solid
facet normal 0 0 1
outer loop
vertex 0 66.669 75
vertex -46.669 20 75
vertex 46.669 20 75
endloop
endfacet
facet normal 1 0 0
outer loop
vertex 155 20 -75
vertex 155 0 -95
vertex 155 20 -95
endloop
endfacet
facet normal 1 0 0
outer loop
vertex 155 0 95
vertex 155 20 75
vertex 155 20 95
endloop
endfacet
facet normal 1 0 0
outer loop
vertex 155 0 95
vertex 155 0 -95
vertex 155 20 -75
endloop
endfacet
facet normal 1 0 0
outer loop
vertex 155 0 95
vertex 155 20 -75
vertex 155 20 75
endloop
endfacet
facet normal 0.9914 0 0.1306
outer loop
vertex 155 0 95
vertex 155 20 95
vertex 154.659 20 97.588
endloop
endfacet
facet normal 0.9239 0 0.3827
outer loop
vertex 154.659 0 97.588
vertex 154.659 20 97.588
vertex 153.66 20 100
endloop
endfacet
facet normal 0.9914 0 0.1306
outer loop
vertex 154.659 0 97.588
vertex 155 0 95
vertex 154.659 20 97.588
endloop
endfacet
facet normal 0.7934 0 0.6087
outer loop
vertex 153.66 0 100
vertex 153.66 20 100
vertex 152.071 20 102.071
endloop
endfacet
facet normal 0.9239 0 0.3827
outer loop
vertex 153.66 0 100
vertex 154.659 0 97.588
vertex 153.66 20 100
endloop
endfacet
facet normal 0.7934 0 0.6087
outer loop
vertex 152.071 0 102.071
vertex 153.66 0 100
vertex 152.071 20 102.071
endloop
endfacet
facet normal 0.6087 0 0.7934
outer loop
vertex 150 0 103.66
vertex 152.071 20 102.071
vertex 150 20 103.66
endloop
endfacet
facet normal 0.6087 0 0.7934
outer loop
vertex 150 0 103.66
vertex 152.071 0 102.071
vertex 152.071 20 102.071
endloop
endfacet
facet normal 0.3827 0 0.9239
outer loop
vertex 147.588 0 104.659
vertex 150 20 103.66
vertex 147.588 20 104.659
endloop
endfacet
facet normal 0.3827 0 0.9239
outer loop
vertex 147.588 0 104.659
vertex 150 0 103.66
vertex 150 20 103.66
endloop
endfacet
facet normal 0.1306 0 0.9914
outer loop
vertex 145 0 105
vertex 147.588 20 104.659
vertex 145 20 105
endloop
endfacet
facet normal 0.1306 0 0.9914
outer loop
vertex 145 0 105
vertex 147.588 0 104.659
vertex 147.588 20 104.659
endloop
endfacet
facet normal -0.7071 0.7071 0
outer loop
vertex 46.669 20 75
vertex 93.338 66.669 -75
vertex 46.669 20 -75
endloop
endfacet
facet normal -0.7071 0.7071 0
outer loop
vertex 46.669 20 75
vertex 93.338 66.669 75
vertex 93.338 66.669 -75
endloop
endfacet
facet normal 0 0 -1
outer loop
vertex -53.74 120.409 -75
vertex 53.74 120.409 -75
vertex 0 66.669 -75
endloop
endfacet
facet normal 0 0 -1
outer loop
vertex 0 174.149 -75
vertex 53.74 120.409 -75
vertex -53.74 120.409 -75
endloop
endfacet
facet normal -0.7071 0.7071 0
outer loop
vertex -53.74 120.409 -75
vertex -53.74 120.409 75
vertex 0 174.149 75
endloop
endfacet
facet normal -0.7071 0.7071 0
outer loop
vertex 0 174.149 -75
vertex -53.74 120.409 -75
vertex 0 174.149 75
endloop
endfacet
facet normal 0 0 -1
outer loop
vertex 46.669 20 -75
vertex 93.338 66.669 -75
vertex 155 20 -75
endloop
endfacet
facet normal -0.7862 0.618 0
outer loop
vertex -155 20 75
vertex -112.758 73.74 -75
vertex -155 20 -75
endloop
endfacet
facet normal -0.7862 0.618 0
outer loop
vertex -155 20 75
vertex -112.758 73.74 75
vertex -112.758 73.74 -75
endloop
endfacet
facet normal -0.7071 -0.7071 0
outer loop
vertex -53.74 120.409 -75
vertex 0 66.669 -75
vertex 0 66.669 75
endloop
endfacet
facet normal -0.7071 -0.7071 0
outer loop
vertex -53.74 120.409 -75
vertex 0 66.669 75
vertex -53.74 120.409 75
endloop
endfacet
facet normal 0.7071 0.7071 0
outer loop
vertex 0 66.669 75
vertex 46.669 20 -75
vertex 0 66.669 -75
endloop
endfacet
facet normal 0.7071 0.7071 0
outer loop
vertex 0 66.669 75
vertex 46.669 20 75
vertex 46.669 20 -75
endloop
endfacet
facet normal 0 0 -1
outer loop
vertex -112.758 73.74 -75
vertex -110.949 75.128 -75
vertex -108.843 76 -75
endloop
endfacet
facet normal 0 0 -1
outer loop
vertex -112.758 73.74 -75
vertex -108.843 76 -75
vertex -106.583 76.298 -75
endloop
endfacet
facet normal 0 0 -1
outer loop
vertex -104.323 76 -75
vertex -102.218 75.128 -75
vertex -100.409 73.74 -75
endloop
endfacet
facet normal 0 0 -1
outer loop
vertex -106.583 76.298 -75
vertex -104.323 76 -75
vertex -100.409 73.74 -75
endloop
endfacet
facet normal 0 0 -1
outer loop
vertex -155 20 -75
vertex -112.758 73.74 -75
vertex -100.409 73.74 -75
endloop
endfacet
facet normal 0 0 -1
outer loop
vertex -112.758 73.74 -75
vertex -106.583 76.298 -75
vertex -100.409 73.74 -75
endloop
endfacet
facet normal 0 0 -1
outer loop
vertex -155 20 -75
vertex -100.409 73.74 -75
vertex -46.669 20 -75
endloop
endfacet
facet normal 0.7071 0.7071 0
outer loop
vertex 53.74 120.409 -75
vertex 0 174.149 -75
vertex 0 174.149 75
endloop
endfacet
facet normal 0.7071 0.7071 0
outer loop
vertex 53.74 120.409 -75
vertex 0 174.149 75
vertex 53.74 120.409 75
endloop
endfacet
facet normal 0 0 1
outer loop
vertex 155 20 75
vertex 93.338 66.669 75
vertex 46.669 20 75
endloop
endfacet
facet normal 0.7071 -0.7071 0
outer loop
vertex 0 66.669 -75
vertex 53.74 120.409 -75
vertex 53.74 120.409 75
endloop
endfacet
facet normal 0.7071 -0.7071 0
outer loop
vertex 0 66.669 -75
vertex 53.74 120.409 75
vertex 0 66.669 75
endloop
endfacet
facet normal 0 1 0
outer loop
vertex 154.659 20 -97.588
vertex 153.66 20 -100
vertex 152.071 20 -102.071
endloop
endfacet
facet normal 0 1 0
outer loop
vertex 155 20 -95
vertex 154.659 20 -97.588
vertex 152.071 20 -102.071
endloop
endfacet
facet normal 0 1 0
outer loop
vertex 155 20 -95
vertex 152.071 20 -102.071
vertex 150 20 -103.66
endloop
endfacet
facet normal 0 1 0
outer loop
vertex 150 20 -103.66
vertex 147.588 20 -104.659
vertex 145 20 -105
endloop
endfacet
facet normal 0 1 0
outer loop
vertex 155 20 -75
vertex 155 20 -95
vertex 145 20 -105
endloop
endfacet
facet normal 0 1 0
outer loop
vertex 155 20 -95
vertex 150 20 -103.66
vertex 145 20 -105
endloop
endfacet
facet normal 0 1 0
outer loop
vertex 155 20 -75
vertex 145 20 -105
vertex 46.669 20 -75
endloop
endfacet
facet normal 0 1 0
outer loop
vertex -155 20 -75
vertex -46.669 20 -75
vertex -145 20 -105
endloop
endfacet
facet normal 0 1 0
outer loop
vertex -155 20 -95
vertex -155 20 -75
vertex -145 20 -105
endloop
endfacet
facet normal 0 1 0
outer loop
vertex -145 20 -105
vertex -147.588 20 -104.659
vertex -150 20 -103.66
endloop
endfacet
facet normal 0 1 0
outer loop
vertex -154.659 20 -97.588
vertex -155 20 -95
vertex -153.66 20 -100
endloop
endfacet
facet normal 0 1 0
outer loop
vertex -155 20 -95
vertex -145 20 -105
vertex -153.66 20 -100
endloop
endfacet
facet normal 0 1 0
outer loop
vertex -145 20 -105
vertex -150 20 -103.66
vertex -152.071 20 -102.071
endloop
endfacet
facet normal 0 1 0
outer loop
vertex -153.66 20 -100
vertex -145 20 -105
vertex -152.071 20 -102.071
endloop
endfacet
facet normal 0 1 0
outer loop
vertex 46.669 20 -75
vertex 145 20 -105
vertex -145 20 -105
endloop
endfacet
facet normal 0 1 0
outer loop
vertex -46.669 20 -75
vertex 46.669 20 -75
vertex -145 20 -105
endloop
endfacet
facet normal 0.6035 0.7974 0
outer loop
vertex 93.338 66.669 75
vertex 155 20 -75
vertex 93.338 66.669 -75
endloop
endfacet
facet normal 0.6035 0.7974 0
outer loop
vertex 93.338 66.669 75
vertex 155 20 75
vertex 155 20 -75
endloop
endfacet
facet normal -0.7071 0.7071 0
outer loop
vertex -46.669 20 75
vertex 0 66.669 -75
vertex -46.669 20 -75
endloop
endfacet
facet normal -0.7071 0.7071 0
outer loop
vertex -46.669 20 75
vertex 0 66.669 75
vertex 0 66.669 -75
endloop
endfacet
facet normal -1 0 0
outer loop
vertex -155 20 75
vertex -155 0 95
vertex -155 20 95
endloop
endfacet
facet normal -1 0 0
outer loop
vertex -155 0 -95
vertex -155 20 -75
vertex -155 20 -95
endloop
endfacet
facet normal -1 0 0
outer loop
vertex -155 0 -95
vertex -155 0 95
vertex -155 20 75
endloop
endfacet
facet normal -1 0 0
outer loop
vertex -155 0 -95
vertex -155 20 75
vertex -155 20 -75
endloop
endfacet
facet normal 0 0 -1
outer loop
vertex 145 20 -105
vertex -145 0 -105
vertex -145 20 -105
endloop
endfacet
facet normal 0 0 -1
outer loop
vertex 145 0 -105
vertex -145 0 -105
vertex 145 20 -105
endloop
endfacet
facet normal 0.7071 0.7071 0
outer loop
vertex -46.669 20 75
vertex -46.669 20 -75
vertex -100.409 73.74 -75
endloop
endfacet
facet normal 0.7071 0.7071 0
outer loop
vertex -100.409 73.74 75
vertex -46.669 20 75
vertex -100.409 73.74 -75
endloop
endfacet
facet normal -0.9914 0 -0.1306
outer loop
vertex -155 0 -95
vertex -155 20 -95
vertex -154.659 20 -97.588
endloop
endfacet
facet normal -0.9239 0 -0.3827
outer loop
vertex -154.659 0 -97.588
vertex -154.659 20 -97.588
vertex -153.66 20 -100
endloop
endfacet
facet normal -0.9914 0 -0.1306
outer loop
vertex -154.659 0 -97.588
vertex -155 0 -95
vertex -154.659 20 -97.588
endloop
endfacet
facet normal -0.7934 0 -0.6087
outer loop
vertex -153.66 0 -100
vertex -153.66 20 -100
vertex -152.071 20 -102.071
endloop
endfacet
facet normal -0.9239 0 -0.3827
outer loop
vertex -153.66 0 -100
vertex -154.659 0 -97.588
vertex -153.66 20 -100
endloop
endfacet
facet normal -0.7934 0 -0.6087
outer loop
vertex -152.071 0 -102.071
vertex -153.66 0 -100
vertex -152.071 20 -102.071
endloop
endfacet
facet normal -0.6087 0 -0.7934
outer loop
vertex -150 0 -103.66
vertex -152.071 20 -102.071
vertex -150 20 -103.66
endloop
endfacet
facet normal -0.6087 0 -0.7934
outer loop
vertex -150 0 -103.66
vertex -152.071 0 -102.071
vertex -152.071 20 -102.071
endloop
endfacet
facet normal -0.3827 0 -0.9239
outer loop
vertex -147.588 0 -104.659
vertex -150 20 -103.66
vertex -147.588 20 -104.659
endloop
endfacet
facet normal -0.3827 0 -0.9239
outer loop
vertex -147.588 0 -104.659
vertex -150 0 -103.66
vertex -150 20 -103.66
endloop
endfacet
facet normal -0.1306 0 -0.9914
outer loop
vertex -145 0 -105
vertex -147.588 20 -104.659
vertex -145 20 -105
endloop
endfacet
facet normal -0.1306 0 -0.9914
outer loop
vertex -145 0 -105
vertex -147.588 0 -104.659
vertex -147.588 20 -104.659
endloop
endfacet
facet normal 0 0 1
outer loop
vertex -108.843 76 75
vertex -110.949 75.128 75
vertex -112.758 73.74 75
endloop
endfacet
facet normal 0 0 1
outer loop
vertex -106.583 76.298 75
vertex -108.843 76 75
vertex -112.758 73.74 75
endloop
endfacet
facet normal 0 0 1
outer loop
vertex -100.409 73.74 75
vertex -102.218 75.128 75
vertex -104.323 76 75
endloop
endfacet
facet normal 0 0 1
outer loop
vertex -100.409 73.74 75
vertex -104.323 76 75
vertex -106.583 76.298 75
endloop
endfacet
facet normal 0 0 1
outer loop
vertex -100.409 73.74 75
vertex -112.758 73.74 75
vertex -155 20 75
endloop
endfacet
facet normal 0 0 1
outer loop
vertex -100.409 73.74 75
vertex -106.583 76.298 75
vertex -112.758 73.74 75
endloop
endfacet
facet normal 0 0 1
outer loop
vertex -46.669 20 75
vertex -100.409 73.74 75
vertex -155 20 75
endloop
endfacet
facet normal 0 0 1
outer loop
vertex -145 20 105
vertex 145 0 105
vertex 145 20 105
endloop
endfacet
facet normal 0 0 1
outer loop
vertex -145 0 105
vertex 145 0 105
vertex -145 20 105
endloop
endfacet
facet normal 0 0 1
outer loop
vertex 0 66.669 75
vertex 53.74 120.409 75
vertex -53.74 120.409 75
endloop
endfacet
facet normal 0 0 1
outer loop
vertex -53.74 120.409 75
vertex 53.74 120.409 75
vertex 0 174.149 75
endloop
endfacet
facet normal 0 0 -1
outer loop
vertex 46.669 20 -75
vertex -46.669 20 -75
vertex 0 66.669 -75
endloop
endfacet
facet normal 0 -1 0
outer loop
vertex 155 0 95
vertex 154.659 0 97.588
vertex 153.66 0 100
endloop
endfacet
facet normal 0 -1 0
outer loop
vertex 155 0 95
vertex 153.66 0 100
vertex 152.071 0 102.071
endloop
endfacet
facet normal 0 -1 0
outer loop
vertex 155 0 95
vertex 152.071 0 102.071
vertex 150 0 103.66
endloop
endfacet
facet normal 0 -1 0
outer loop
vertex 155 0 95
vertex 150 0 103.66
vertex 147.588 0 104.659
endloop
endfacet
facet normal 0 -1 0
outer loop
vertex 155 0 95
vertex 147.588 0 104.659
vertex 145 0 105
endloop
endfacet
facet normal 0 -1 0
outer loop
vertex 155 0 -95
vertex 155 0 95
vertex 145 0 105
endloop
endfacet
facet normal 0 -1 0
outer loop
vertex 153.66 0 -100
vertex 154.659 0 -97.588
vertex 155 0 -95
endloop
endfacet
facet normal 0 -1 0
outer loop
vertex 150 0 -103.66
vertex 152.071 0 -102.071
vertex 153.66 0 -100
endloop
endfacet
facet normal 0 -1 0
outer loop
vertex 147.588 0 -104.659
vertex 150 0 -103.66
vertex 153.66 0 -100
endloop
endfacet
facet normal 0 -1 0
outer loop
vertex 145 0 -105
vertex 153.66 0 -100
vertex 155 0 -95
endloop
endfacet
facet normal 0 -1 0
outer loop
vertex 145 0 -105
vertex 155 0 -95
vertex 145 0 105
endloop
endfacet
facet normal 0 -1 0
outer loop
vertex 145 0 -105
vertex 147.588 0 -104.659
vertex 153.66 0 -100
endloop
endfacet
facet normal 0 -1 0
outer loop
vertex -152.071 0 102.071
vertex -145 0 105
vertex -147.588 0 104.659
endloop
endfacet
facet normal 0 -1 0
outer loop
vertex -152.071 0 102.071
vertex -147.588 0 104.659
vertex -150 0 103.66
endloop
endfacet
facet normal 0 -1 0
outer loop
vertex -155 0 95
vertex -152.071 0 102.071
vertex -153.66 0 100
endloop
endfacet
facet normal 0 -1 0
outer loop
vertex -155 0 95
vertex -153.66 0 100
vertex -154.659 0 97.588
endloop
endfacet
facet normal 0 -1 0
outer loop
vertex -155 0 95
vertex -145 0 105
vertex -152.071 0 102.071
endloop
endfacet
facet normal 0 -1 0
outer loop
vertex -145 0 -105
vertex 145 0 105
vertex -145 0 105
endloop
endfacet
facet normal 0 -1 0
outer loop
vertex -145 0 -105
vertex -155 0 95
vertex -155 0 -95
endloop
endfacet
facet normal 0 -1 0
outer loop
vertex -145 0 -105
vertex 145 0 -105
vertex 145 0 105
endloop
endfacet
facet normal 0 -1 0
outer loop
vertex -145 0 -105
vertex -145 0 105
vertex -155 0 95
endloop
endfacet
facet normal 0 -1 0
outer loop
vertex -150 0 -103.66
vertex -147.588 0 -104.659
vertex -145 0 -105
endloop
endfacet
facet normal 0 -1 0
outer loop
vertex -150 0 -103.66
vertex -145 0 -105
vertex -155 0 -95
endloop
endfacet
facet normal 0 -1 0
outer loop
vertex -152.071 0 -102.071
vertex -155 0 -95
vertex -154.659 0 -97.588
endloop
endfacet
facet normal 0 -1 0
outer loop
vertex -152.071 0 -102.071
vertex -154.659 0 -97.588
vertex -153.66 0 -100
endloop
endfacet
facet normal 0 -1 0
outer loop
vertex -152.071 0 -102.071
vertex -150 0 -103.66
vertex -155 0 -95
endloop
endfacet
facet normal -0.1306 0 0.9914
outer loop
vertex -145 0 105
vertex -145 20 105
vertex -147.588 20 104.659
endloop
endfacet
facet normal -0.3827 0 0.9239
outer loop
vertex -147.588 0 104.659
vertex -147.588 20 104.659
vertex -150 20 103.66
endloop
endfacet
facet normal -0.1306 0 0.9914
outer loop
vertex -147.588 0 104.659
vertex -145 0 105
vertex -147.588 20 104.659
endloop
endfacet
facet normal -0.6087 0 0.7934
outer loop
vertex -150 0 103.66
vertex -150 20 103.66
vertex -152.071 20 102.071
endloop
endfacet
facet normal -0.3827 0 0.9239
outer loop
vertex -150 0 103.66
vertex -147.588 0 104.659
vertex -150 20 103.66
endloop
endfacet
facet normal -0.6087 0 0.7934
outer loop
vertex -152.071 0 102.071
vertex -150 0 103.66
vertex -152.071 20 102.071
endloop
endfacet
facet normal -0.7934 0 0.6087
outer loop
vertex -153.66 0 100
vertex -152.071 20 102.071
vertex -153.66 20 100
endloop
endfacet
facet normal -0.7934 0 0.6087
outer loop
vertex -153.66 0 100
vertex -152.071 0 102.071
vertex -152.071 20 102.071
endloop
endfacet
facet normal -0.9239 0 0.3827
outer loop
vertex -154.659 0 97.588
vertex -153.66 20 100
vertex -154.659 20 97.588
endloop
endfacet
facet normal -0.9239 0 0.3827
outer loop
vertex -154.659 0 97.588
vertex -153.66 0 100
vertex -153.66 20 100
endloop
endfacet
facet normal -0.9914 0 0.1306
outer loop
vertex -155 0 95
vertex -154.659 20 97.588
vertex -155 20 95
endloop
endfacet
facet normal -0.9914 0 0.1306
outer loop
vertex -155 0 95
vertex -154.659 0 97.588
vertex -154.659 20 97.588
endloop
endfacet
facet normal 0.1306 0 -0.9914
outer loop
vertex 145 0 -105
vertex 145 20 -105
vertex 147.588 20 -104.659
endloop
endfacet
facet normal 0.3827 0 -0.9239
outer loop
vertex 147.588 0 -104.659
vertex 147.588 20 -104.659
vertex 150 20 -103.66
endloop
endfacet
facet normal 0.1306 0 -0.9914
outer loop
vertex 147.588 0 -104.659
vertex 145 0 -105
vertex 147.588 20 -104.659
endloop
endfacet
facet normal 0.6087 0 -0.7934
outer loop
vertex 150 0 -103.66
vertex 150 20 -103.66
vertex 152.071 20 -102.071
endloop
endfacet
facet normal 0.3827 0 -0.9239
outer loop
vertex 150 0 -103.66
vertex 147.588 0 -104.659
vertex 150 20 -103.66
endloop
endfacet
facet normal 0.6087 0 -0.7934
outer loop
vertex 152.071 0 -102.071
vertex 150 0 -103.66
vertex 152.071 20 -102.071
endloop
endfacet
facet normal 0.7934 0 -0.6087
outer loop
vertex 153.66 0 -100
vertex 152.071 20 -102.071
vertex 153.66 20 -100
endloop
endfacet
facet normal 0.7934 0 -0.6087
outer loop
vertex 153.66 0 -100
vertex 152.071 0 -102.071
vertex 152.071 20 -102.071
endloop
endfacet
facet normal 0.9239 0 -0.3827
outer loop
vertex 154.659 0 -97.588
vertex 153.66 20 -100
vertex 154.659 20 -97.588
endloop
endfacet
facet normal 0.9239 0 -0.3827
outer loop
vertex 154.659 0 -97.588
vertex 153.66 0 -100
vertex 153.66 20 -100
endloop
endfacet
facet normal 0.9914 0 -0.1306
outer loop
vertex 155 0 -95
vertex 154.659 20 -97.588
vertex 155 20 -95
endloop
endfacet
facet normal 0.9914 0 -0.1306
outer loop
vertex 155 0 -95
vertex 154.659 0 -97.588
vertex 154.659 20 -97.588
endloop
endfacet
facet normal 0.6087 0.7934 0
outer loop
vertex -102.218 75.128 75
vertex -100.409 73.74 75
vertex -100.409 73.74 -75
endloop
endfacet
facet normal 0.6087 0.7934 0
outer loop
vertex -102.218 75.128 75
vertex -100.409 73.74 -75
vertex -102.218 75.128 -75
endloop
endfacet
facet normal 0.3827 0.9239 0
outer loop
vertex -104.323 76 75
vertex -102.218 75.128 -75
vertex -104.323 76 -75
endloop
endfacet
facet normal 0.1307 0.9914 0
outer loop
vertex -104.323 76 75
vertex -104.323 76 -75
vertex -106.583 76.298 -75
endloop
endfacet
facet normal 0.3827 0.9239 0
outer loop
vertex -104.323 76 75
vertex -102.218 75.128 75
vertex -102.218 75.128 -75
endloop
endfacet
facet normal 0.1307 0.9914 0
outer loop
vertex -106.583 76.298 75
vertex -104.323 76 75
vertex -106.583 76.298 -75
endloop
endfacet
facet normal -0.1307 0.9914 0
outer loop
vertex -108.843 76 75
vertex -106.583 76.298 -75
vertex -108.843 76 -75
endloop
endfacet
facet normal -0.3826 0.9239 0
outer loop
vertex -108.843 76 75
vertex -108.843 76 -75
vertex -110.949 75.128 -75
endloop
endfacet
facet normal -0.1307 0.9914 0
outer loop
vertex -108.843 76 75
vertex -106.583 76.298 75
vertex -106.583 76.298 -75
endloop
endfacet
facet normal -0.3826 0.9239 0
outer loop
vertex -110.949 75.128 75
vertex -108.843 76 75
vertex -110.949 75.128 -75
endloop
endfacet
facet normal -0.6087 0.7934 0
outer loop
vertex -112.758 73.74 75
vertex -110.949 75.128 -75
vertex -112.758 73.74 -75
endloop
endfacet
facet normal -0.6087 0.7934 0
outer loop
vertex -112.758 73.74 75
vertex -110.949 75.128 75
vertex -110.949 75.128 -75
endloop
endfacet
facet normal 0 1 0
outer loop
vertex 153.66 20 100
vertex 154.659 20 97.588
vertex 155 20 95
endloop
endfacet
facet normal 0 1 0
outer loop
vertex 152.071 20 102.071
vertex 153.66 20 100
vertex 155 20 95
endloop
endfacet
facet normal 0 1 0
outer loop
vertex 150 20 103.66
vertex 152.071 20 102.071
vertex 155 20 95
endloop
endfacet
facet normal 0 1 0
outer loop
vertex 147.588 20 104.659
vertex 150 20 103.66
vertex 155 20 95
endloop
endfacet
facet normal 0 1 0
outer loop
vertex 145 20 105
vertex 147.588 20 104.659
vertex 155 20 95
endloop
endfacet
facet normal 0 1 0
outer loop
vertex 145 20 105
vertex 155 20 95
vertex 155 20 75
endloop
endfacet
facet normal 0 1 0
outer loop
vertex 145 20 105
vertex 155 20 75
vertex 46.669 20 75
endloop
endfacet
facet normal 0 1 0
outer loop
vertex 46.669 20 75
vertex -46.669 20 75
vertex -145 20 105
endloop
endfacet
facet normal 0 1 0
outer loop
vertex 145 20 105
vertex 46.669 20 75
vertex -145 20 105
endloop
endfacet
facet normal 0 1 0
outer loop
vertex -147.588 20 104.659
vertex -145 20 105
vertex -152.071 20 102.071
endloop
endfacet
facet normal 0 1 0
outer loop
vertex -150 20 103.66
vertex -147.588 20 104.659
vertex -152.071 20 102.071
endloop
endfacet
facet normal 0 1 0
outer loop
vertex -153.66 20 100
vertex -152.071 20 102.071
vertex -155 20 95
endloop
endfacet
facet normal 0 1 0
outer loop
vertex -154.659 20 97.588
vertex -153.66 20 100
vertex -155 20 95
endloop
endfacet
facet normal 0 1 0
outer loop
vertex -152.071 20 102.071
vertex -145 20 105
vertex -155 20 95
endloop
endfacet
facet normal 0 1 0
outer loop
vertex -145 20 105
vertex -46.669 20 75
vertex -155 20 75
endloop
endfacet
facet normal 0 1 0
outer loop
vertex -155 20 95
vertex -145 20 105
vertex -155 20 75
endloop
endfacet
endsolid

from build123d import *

# Parameters (mm, degrees)
BOSS_EXTRUDE1_DEPTH = 20
BOSS_EXTRUDE2_DEPTH = 75


with BuildPart() as part:
    # Sketch2 → Boss-Extrude1 (new body)
    with BuildSketch(Plane(origin=(0, 0, 0), x_dir=(1, 0, 0), z_dir=(0, 1, 0))):
        with BuildLine():
            Line((-145, 105), (145, 105))
            ThreePointArc((145, 105), (152.071067812, 102.071067812), (155, 95))
            Line((155, 95), (155, -95))
            ThreePointArc((155, -95), (152.071067812, -102.071067812), (145, -105))
            Line((145, -105), (-145, -105))
            ThreePointArc((-145, -105), (-152.071067812, -102.071067812), (-155, -95))
            Line((-155, -95), (-155, 95))
            ThreePointArc((-155, 95), (-152.071067812, 102.071067812), (-145, 105))
        make_face()
    extrude(amount=BOSS_EXTRUDE1_DEPTH)

    # Sketch4 → Boss-Extrude2 (add, symmetric)
    with BuildSketch(Plane.XY):
        with BuildLine():
            Line((-155, 20), (-46.669047558, 20))
            Line((-46.669047558, 20), (-100.409162928, 73.74011537))
            ThreePointArc((-100.409162928, 73.74011537), (-106.583385641, 76.297562155), (-112.757608353, 73.74011537))
            Line((-112.757608353, 73.74011537), (-155, 20))
        make_face()
        Polygon((46.669047558, 20), (0, 66.669047558), (-46.669047558, 20), align=None)
        Polygon((93.338095117, 66.669047558), (46.669047558, 20), (155, 20), align=None)
        Polygon((0, 174.149278299), (53.74011537, 120.409162928), (0, 66.669047558), (-53.74011537, 120.409162928), align=None)
    extrude(amount=BOSS_EXTRUDE2_DEPTH, both=True)


with BuildPart() as boss_extrude2_piece_1:
    # of the separate pieces the step leaves, piece 1, a body of its own (boss_extrude2_pieces)
    add(part.part.solids().sort_by_distance((-145, 0, -105))[0])


with BuildPart() as boss_extrude2_piece_2:
    # of the separate pieces the step leaves, piece 2, a body of its own (boss_extrude2_pieces)
    add(part.part.solids().sort_by_distance((-53.74011537, 120.409162928, -75))[0])


solid = Compound([boss_extrude2_piece_1.part, boss_extrude2_piece_2.part])
